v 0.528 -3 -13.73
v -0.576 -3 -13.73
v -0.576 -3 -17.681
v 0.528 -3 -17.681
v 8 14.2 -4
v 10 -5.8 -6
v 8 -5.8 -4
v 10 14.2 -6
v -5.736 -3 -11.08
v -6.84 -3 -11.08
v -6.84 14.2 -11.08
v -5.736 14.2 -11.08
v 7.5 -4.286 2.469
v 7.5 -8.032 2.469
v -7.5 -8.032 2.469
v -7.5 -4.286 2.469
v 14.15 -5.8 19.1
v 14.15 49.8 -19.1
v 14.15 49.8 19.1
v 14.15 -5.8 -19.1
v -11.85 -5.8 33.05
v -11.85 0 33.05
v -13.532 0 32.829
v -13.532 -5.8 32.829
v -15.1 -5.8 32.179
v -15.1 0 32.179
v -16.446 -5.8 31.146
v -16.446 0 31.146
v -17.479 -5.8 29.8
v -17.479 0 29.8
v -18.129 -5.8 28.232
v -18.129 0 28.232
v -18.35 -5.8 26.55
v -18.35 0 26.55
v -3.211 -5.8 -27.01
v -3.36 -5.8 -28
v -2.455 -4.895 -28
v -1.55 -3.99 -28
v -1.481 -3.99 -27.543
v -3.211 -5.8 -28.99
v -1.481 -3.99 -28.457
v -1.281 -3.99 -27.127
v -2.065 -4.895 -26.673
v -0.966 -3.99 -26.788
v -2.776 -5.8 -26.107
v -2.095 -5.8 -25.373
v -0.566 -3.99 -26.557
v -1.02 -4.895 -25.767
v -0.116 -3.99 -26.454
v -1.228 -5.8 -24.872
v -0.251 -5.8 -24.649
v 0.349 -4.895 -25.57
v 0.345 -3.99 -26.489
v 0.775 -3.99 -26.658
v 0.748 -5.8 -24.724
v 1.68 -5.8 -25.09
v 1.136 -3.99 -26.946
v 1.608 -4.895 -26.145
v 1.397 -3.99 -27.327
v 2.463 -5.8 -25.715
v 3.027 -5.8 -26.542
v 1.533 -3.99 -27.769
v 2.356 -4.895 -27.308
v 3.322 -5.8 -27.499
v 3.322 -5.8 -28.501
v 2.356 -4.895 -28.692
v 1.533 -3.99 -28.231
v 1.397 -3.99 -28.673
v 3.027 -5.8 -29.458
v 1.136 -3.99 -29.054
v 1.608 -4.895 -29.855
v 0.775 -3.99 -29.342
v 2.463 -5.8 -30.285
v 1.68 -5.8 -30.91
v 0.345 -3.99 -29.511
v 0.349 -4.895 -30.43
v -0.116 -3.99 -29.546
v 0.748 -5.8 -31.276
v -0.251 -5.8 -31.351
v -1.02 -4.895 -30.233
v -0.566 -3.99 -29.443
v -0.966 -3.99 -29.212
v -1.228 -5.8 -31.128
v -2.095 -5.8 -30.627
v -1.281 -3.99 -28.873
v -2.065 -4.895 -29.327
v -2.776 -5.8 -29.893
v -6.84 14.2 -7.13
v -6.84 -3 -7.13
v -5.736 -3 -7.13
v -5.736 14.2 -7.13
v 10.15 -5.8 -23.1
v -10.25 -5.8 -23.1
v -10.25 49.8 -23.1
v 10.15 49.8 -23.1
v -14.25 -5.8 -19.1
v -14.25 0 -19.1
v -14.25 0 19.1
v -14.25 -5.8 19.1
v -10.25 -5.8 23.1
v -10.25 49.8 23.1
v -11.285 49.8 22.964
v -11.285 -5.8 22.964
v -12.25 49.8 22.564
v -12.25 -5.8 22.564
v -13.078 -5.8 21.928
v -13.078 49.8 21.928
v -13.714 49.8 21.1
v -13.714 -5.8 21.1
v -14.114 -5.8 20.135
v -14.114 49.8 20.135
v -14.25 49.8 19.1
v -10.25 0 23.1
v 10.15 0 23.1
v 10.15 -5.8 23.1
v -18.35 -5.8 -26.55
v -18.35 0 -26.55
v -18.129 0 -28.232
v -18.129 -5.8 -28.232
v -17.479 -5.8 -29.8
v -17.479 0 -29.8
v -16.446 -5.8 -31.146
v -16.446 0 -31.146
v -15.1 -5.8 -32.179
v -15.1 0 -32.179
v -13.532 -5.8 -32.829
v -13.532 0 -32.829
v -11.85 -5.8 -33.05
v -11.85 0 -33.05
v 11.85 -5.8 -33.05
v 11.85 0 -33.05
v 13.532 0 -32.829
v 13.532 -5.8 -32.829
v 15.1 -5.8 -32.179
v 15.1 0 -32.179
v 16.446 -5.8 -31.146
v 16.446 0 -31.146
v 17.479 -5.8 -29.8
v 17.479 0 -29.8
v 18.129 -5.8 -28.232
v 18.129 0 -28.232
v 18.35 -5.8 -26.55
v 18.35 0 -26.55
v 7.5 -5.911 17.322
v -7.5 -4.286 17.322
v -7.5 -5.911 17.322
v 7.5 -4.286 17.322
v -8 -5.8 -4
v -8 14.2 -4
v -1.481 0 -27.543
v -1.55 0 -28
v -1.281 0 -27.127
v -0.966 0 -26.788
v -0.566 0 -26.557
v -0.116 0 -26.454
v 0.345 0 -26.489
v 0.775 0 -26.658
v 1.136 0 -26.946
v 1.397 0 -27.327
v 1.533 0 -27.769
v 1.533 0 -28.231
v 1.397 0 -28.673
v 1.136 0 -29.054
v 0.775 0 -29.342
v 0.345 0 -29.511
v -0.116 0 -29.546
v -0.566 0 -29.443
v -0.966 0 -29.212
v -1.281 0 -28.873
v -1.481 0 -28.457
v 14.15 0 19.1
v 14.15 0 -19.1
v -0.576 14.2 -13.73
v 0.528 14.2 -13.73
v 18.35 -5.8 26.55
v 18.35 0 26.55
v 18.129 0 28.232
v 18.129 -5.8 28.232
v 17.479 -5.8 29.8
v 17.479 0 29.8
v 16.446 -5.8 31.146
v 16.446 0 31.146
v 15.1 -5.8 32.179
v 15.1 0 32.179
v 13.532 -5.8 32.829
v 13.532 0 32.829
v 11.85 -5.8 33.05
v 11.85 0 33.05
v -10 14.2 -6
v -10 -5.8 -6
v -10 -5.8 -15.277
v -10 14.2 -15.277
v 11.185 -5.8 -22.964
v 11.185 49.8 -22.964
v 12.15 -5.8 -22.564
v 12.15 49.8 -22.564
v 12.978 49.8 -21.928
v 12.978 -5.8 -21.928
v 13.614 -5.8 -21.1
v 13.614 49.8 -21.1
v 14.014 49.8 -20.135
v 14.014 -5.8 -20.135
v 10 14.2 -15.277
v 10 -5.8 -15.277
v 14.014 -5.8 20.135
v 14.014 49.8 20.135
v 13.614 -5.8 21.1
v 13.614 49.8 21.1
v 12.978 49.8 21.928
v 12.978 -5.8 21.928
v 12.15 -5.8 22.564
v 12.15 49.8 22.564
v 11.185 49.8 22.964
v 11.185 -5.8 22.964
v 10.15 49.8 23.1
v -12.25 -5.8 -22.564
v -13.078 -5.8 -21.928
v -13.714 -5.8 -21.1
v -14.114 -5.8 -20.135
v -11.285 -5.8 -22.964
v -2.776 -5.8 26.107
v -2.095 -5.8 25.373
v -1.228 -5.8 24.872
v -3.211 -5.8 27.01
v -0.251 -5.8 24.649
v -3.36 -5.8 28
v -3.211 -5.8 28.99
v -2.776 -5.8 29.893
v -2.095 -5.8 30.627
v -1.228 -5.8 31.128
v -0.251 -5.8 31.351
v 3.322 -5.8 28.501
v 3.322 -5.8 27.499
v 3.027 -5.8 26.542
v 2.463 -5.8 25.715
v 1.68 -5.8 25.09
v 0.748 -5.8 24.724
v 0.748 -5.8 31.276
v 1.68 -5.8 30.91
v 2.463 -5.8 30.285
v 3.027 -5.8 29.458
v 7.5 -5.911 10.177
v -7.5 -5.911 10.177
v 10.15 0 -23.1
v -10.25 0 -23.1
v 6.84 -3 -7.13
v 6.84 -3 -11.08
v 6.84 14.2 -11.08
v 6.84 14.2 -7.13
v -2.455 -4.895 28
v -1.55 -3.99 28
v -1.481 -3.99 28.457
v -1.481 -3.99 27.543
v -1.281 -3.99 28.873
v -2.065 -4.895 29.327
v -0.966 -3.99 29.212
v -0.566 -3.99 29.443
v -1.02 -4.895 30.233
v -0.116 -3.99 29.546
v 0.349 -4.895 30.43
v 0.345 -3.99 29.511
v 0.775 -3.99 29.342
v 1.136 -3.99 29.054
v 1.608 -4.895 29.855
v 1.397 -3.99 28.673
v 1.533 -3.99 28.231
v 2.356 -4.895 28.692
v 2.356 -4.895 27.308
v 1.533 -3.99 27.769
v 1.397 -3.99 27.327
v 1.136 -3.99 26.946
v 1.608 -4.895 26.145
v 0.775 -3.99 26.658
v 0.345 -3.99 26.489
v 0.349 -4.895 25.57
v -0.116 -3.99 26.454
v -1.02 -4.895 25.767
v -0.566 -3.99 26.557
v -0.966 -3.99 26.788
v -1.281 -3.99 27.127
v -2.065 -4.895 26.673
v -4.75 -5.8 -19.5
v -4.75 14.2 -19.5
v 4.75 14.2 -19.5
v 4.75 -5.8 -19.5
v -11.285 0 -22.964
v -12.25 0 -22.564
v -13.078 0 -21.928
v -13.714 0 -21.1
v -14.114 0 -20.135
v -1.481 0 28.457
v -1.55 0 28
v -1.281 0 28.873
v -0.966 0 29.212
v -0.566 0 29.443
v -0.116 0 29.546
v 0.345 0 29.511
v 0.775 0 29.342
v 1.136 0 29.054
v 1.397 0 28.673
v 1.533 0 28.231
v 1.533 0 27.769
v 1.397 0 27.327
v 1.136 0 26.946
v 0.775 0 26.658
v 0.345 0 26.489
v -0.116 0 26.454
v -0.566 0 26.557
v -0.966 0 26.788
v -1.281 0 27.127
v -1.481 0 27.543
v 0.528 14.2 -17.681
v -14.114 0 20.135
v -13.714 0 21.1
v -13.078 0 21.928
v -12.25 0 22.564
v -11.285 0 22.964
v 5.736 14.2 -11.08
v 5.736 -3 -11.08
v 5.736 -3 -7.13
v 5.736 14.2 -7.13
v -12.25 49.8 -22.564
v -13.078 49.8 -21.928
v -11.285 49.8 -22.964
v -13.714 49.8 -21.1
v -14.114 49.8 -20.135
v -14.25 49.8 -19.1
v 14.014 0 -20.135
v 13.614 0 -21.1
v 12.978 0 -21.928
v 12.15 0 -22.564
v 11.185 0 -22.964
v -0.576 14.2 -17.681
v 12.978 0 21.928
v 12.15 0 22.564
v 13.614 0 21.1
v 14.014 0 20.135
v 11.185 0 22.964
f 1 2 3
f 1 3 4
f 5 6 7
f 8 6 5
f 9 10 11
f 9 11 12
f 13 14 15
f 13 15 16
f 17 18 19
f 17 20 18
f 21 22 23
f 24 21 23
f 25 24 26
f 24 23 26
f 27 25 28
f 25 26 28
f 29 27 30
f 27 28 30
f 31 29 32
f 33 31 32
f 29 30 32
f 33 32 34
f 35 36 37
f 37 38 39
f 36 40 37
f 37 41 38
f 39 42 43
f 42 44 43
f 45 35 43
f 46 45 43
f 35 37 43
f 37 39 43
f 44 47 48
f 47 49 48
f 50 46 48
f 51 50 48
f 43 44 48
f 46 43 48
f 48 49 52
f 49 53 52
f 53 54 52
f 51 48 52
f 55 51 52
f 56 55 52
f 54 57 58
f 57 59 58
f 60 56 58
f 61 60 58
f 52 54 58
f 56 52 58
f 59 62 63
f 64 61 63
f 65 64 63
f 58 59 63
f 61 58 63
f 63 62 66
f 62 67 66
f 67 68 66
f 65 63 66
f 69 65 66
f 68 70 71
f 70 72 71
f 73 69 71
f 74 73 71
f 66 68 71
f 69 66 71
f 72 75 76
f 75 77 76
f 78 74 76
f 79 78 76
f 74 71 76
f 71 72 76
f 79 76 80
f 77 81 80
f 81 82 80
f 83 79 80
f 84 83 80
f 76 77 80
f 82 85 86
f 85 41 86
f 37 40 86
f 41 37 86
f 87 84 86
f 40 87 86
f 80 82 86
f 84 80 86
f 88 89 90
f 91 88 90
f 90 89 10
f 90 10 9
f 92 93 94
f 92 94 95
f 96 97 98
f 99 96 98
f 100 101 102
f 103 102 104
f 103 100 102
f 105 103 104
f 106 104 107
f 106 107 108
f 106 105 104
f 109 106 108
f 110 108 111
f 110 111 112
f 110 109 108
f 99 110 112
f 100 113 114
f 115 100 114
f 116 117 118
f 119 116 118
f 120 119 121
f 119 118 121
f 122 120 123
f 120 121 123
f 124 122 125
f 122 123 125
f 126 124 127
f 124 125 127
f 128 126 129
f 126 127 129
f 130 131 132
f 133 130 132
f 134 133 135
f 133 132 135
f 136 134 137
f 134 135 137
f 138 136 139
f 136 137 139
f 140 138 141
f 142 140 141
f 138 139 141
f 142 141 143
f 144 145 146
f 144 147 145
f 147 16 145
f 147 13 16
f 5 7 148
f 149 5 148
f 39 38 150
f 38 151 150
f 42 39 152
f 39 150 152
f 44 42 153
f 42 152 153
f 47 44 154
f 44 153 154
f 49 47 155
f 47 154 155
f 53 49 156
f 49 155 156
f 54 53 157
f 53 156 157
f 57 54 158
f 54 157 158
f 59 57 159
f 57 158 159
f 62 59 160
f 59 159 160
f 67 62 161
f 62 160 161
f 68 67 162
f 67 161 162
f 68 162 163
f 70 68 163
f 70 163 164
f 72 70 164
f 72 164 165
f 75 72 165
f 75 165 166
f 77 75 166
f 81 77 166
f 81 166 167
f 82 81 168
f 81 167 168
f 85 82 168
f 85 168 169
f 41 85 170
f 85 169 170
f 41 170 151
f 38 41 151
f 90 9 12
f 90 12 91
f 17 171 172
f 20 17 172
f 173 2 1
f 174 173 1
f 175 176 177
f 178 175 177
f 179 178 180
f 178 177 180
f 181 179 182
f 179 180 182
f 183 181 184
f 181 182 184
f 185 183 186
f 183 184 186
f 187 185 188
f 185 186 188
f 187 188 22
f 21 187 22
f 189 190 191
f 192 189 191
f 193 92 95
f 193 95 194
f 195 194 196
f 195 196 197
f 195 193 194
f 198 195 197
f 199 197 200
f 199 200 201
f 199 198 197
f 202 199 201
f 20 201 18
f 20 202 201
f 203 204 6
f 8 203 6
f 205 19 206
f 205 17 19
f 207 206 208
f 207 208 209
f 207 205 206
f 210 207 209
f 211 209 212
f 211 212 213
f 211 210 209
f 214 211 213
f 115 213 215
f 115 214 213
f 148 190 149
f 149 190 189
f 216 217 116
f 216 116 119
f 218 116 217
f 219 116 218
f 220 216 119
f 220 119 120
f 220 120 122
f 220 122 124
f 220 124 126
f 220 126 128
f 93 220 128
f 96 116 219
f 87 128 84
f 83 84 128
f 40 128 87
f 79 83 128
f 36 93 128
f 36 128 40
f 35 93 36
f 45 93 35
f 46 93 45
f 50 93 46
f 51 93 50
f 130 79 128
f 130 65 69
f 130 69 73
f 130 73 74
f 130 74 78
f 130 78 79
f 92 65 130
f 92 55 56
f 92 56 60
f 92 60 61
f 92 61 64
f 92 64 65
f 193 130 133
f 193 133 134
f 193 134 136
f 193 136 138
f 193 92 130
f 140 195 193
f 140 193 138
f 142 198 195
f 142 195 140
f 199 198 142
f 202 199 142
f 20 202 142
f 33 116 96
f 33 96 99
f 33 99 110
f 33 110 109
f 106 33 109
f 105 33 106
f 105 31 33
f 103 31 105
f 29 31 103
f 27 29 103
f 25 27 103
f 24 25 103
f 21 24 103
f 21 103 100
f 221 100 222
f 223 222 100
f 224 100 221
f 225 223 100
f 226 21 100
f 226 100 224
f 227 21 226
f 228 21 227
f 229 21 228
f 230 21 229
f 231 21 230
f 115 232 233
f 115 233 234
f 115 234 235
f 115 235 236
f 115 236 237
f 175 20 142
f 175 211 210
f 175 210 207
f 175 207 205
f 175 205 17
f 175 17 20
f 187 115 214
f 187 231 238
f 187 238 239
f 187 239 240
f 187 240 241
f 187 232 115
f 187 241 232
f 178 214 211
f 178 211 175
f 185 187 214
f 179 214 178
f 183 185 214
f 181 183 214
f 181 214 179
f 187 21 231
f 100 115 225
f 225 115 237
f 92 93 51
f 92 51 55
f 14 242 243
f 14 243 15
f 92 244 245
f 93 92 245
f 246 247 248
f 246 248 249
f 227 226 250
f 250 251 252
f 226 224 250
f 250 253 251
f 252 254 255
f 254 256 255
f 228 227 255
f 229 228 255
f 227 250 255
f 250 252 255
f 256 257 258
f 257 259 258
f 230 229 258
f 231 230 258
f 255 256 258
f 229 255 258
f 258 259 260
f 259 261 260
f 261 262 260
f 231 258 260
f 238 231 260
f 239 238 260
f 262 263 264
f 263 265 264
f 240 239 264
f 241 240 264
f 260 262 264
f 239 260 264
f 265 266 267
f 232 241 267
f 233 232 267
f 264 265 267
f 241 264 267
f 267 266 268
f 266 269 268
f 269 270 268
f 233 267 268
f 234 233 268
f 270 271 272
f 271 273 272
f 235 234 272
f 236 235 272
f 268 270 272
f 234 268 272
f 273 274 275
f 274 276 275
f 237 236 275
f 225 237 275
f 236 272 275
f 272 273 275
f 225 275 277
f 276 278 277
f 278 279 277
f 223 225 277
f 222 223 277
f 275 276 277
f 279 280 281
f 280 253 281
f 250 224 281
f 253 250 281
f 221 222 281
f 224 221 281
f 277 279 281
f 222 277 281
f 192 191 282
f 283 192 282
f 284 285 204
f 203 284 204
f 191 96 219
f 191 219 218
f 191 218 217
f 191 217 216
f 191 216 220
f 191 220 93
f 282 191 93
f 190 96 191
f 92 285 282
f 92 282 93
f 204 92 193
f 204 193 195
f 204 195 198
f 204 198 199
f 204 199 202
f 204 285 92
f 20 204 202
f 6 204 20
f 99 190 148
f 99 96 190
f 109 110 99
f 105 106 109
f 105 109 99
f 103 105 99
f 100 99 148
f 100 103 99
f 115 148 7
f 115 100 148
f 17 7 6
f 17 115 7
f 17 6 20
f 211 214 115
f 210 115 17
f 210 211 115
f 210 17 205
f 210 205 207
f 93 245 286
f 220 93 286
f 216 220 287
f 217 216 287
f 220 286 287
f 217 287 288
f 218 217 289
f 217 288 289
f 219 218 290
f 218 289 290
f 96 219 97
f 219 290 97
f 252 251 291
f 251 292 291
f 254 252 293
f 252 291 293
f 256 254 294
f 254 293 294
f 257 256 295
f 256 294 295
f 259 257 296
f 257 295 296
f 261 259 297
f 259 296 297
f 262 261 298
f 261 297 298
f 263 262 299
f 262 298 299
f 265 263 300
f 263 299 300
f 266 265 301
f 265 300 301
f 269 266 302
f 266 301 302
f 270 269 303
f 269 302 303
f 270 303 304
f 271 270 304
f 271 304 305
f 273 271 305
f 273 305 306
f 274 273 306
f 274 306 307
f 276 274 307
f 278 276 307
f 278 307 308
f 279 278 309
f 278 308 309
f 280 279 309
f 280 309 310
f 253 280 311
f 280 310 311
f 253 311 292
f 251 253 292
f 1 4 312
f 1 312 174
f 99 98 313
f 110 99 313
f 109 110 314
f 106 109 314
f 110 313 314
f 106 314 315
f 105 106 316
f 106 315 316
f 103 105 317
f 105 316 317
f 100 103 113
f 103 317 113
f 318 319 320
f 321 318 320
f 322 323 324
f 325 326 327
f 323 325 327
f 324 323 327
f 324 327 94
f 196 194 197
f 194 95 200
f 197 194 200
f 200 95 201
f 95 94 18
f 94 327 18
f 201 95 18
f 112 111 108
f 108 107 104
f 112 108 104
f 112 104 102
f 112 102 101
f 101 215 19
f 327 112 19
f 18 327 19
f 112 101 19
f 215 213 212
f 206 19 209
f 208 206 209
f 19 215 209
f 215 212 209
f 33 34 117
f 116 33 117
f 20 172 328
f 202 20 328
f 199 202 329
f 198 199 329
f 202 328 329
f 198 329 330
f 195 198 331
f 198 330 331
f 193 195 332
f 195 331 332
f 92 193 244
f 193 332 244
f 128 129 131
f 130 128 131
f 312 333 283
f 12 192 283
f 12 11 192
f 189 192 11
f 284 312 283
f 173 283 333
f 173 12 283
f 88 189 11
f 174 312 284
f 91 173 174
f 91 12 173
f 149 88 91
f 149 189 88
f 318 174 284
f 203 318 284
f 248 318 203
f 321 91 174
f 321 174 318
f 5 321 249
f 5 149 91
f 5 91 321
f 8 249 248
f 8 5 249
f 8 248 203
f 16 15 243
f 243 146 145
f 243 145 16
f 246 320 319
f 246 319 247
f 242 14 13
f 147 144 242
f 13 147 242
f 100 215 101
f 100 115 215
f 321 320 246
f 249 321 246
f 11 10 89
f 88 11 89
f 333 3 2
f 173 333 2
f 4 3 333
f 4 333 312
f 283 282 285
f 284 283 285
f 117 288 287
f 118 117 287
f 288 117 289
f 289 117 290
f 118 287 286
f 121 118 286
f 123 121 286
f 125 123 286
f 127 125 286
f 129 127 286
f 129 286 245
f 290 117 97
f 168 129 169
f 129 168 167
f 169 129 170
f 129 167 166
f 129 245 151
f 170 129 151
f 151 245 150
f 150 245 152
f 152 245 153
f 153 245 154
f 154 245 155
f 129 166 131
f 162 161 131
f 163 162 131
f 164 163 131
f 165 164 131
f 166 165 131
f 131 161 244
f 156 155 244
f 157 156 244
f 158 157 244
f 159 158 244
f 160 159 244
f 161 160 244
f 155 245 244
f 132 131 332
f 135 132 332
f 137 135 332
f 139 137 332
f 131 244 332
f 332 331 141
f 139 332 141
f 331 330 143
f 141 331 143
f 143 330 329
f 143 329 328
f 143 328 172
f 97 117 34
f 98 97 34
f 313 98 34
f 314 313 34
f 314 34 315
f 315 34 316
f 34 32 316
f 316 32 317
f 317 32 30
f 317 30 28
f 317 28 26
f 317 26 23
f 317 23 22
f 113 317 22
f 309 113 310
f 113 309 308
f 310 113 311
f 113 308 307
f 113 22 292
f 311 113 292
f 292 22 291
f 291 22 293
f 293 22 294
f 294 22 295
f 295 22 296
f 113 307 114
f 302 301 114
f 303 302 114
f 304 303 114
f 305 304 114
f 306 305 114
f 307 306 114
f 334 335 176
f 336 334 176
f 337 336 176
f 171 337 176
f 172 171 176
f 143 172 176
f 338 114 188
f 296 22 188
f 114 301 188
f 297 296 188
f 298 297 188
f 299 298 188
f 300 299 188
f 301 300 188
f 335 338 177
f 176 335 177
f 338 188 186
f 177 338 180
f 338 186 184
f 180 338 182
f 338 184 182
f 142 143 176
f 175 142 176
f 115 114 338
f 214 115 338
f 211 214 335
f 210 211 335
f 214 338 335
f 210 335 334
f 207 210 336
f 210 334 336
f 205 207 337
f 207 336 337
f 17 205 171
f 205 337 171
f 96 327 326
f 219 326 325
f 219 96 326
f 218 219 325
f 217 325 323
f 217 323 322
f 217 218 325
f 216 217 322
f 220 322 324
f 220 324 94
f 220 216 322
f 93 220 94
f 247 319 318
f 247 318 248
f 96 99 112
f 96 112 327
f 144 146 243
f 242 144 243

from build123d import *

# Parameters (mm, degrees)
F1_DEPTH       = 5.8
F2_DEPTH       = 5.8
F2_DEPTH_BACK  = 49.8
F4_D           = 3.1
F4_CSINK_D     = 6.72
F4_CSINK_ANGLE = 90
F6_DEPTH       = 20
F7_SIZE        = 2
F8_W           = 1.10455
F8_H           = 3.950565
F9_DEPTH       = 3
F9_DEPTH_BACK  = 15
F11_DEPTH      = 7.5


with BuildPart() as f1:
    # F0 (on Front) → F1 (new body)
    with BuildSketch(Plane.XZ):
        with BuildLine():
            Line((-11.85, -33.05), (11.85, -33.05))
            ThreePointArc((11.85, -33.05), (16.446194, -31.146194), (18.35, -26.55))
            Line((18.35, -26.55), (18.35, 26.55))
            ThreePointArc((18.35, 26.55), (16.446194, 31.146194), (11.85, 33.05))
            Line((11.85, 33.05), (-11.85, 33.05))
            ThreePointArc((-11.85, 33.05), (-16.446194, 31.146194), (-18.35, 26.55))
            Line((-18.35, 26.55), (-18.35, -26.55))
            ThreePointArc((-18.35, -26.55), (-16.446194, -31.146194), (-11.85, -33.05))
        make_face()
        with BuildLine():
            ThreePointArc((-14.25, 19.1), (-13.078427, 21.928427), (-10.25, 23.1))
            Line((-10.25, 23.1), (10.15, 23.1))
            ThreePointArc((10.15, 23.1), (12.978427, 21.928427), (14.15, 19.1))
            Line((14.15, 19.1), (14.15, -19.1))
            ThreePointArc((14.15, -19.1), (12.978427, -21.928427), (10.15, -23.1))
            Line((10.15, -23.1), (-10.25, -23.1))
            ThreePointArc((-10.25, -23.1), (-13.078427, -21.928427), (-14.25, -19.1))
            Line((-14.25, -19.1), (-14.25, 19.1))
        make_face(mode=Mode.SUBTRACT)
    extrude(amount=F1_DEPTH)

    # F4 (through all)
    with Locations(Plane.XZ.offset(5.8)):
        with Locations((0, 28), (0, -28)):
            CounterSinkHole(F4_D / 2, F4_CSINK_D / 2, counter_sink_angle=F4_CSINK_ANGLE)


with BuildPart() as f2:
    # F0 (on Front) → F2 (new body, two sides)
    with BuildSketch(Plane.XZ) as f2_sk:
        with BuildLine():
            Line((10.15, 23.1), (-10.25, 23.1))
            ThreePointArc((-10.25, 23.1), (-13.078427, 21.928427), (-14.25, 19.1))
            Line((-14.25, 19.1), (-14.25, -19.1))
            ThreePointArc((-14.25, -19.1), (-13.078427, -21.928427), (-10.25, -23.1))
            Line((-10.25, -23.1), (10.15, -23.1))
            ThreePointArc((10.15, -23.1), (12.978427, -21.928427), (14.15, -19.1))
            Line((14.15, -19.1), (14.15, 19.1))
            ThreePointArc((14.15, 19.1), (12.978427, 21.928427), (10.15, 23.1))
        make_face()
    extrude(amount=F2_DEPTH)
    extrude(f2_sk.sketch, amount=-F2_DEPTH_BACK)

    # F5 (on face) → F6 (cut)
    with BuildSketch(Plane.XZ.offset(5.8)):
        Polygon((10, -4), (-10, -4), (-10, -15.276731), (-4.75, -19.5), (4.75, -19.5), (10, -15.276731), align=None)
    extrude(amount=-F6_DEPTH, mode=Mode.SUBTRACT)

    # F7
    f7_edges = [f2.edges().sort_by_distance(p)[0] for p in [
        (10, 4.2, -4),
        (-10, 4.2, -4),
    ]]
    chamfer(f7_edges, length=F7_SIZE)

    # F8 (on face) → F9 (join, two sides)
    with BuildSketch(Plane.XZ) as f9_sk:
        with Locations((-6.288206, -9.105137)):
            Rectangle(F8_W, F8_H)
        with Locations((6.288206, -9.105137)):
            Rectangle(F8_W, F8_H)
        with Locations((-0.023888, -15.705768)):
            Rectangle(F8_W, F8_H)
    extrude(amount=F9_DEPTH)
    extrude(f9_sk.sketch, amount=-F9_DEPTH_BACK)


with BuildPart() as f11:
    # F10 (on Right) → F11 (new body, symmetric)
    with BuildSketch(Plane.YZ):
        Polygon((-5.91071, 17.321525), (-5.91071, 10.176873), (-8.032478, 2.468971), (-4.28624, 2.468971), (-4.28624, 17.321525), (-5.8, 17.321525), align=None)
    extrude(amount=F11_DEPTH, both=True)


solid = Compound([f1.part, f2.part, f11.part])
